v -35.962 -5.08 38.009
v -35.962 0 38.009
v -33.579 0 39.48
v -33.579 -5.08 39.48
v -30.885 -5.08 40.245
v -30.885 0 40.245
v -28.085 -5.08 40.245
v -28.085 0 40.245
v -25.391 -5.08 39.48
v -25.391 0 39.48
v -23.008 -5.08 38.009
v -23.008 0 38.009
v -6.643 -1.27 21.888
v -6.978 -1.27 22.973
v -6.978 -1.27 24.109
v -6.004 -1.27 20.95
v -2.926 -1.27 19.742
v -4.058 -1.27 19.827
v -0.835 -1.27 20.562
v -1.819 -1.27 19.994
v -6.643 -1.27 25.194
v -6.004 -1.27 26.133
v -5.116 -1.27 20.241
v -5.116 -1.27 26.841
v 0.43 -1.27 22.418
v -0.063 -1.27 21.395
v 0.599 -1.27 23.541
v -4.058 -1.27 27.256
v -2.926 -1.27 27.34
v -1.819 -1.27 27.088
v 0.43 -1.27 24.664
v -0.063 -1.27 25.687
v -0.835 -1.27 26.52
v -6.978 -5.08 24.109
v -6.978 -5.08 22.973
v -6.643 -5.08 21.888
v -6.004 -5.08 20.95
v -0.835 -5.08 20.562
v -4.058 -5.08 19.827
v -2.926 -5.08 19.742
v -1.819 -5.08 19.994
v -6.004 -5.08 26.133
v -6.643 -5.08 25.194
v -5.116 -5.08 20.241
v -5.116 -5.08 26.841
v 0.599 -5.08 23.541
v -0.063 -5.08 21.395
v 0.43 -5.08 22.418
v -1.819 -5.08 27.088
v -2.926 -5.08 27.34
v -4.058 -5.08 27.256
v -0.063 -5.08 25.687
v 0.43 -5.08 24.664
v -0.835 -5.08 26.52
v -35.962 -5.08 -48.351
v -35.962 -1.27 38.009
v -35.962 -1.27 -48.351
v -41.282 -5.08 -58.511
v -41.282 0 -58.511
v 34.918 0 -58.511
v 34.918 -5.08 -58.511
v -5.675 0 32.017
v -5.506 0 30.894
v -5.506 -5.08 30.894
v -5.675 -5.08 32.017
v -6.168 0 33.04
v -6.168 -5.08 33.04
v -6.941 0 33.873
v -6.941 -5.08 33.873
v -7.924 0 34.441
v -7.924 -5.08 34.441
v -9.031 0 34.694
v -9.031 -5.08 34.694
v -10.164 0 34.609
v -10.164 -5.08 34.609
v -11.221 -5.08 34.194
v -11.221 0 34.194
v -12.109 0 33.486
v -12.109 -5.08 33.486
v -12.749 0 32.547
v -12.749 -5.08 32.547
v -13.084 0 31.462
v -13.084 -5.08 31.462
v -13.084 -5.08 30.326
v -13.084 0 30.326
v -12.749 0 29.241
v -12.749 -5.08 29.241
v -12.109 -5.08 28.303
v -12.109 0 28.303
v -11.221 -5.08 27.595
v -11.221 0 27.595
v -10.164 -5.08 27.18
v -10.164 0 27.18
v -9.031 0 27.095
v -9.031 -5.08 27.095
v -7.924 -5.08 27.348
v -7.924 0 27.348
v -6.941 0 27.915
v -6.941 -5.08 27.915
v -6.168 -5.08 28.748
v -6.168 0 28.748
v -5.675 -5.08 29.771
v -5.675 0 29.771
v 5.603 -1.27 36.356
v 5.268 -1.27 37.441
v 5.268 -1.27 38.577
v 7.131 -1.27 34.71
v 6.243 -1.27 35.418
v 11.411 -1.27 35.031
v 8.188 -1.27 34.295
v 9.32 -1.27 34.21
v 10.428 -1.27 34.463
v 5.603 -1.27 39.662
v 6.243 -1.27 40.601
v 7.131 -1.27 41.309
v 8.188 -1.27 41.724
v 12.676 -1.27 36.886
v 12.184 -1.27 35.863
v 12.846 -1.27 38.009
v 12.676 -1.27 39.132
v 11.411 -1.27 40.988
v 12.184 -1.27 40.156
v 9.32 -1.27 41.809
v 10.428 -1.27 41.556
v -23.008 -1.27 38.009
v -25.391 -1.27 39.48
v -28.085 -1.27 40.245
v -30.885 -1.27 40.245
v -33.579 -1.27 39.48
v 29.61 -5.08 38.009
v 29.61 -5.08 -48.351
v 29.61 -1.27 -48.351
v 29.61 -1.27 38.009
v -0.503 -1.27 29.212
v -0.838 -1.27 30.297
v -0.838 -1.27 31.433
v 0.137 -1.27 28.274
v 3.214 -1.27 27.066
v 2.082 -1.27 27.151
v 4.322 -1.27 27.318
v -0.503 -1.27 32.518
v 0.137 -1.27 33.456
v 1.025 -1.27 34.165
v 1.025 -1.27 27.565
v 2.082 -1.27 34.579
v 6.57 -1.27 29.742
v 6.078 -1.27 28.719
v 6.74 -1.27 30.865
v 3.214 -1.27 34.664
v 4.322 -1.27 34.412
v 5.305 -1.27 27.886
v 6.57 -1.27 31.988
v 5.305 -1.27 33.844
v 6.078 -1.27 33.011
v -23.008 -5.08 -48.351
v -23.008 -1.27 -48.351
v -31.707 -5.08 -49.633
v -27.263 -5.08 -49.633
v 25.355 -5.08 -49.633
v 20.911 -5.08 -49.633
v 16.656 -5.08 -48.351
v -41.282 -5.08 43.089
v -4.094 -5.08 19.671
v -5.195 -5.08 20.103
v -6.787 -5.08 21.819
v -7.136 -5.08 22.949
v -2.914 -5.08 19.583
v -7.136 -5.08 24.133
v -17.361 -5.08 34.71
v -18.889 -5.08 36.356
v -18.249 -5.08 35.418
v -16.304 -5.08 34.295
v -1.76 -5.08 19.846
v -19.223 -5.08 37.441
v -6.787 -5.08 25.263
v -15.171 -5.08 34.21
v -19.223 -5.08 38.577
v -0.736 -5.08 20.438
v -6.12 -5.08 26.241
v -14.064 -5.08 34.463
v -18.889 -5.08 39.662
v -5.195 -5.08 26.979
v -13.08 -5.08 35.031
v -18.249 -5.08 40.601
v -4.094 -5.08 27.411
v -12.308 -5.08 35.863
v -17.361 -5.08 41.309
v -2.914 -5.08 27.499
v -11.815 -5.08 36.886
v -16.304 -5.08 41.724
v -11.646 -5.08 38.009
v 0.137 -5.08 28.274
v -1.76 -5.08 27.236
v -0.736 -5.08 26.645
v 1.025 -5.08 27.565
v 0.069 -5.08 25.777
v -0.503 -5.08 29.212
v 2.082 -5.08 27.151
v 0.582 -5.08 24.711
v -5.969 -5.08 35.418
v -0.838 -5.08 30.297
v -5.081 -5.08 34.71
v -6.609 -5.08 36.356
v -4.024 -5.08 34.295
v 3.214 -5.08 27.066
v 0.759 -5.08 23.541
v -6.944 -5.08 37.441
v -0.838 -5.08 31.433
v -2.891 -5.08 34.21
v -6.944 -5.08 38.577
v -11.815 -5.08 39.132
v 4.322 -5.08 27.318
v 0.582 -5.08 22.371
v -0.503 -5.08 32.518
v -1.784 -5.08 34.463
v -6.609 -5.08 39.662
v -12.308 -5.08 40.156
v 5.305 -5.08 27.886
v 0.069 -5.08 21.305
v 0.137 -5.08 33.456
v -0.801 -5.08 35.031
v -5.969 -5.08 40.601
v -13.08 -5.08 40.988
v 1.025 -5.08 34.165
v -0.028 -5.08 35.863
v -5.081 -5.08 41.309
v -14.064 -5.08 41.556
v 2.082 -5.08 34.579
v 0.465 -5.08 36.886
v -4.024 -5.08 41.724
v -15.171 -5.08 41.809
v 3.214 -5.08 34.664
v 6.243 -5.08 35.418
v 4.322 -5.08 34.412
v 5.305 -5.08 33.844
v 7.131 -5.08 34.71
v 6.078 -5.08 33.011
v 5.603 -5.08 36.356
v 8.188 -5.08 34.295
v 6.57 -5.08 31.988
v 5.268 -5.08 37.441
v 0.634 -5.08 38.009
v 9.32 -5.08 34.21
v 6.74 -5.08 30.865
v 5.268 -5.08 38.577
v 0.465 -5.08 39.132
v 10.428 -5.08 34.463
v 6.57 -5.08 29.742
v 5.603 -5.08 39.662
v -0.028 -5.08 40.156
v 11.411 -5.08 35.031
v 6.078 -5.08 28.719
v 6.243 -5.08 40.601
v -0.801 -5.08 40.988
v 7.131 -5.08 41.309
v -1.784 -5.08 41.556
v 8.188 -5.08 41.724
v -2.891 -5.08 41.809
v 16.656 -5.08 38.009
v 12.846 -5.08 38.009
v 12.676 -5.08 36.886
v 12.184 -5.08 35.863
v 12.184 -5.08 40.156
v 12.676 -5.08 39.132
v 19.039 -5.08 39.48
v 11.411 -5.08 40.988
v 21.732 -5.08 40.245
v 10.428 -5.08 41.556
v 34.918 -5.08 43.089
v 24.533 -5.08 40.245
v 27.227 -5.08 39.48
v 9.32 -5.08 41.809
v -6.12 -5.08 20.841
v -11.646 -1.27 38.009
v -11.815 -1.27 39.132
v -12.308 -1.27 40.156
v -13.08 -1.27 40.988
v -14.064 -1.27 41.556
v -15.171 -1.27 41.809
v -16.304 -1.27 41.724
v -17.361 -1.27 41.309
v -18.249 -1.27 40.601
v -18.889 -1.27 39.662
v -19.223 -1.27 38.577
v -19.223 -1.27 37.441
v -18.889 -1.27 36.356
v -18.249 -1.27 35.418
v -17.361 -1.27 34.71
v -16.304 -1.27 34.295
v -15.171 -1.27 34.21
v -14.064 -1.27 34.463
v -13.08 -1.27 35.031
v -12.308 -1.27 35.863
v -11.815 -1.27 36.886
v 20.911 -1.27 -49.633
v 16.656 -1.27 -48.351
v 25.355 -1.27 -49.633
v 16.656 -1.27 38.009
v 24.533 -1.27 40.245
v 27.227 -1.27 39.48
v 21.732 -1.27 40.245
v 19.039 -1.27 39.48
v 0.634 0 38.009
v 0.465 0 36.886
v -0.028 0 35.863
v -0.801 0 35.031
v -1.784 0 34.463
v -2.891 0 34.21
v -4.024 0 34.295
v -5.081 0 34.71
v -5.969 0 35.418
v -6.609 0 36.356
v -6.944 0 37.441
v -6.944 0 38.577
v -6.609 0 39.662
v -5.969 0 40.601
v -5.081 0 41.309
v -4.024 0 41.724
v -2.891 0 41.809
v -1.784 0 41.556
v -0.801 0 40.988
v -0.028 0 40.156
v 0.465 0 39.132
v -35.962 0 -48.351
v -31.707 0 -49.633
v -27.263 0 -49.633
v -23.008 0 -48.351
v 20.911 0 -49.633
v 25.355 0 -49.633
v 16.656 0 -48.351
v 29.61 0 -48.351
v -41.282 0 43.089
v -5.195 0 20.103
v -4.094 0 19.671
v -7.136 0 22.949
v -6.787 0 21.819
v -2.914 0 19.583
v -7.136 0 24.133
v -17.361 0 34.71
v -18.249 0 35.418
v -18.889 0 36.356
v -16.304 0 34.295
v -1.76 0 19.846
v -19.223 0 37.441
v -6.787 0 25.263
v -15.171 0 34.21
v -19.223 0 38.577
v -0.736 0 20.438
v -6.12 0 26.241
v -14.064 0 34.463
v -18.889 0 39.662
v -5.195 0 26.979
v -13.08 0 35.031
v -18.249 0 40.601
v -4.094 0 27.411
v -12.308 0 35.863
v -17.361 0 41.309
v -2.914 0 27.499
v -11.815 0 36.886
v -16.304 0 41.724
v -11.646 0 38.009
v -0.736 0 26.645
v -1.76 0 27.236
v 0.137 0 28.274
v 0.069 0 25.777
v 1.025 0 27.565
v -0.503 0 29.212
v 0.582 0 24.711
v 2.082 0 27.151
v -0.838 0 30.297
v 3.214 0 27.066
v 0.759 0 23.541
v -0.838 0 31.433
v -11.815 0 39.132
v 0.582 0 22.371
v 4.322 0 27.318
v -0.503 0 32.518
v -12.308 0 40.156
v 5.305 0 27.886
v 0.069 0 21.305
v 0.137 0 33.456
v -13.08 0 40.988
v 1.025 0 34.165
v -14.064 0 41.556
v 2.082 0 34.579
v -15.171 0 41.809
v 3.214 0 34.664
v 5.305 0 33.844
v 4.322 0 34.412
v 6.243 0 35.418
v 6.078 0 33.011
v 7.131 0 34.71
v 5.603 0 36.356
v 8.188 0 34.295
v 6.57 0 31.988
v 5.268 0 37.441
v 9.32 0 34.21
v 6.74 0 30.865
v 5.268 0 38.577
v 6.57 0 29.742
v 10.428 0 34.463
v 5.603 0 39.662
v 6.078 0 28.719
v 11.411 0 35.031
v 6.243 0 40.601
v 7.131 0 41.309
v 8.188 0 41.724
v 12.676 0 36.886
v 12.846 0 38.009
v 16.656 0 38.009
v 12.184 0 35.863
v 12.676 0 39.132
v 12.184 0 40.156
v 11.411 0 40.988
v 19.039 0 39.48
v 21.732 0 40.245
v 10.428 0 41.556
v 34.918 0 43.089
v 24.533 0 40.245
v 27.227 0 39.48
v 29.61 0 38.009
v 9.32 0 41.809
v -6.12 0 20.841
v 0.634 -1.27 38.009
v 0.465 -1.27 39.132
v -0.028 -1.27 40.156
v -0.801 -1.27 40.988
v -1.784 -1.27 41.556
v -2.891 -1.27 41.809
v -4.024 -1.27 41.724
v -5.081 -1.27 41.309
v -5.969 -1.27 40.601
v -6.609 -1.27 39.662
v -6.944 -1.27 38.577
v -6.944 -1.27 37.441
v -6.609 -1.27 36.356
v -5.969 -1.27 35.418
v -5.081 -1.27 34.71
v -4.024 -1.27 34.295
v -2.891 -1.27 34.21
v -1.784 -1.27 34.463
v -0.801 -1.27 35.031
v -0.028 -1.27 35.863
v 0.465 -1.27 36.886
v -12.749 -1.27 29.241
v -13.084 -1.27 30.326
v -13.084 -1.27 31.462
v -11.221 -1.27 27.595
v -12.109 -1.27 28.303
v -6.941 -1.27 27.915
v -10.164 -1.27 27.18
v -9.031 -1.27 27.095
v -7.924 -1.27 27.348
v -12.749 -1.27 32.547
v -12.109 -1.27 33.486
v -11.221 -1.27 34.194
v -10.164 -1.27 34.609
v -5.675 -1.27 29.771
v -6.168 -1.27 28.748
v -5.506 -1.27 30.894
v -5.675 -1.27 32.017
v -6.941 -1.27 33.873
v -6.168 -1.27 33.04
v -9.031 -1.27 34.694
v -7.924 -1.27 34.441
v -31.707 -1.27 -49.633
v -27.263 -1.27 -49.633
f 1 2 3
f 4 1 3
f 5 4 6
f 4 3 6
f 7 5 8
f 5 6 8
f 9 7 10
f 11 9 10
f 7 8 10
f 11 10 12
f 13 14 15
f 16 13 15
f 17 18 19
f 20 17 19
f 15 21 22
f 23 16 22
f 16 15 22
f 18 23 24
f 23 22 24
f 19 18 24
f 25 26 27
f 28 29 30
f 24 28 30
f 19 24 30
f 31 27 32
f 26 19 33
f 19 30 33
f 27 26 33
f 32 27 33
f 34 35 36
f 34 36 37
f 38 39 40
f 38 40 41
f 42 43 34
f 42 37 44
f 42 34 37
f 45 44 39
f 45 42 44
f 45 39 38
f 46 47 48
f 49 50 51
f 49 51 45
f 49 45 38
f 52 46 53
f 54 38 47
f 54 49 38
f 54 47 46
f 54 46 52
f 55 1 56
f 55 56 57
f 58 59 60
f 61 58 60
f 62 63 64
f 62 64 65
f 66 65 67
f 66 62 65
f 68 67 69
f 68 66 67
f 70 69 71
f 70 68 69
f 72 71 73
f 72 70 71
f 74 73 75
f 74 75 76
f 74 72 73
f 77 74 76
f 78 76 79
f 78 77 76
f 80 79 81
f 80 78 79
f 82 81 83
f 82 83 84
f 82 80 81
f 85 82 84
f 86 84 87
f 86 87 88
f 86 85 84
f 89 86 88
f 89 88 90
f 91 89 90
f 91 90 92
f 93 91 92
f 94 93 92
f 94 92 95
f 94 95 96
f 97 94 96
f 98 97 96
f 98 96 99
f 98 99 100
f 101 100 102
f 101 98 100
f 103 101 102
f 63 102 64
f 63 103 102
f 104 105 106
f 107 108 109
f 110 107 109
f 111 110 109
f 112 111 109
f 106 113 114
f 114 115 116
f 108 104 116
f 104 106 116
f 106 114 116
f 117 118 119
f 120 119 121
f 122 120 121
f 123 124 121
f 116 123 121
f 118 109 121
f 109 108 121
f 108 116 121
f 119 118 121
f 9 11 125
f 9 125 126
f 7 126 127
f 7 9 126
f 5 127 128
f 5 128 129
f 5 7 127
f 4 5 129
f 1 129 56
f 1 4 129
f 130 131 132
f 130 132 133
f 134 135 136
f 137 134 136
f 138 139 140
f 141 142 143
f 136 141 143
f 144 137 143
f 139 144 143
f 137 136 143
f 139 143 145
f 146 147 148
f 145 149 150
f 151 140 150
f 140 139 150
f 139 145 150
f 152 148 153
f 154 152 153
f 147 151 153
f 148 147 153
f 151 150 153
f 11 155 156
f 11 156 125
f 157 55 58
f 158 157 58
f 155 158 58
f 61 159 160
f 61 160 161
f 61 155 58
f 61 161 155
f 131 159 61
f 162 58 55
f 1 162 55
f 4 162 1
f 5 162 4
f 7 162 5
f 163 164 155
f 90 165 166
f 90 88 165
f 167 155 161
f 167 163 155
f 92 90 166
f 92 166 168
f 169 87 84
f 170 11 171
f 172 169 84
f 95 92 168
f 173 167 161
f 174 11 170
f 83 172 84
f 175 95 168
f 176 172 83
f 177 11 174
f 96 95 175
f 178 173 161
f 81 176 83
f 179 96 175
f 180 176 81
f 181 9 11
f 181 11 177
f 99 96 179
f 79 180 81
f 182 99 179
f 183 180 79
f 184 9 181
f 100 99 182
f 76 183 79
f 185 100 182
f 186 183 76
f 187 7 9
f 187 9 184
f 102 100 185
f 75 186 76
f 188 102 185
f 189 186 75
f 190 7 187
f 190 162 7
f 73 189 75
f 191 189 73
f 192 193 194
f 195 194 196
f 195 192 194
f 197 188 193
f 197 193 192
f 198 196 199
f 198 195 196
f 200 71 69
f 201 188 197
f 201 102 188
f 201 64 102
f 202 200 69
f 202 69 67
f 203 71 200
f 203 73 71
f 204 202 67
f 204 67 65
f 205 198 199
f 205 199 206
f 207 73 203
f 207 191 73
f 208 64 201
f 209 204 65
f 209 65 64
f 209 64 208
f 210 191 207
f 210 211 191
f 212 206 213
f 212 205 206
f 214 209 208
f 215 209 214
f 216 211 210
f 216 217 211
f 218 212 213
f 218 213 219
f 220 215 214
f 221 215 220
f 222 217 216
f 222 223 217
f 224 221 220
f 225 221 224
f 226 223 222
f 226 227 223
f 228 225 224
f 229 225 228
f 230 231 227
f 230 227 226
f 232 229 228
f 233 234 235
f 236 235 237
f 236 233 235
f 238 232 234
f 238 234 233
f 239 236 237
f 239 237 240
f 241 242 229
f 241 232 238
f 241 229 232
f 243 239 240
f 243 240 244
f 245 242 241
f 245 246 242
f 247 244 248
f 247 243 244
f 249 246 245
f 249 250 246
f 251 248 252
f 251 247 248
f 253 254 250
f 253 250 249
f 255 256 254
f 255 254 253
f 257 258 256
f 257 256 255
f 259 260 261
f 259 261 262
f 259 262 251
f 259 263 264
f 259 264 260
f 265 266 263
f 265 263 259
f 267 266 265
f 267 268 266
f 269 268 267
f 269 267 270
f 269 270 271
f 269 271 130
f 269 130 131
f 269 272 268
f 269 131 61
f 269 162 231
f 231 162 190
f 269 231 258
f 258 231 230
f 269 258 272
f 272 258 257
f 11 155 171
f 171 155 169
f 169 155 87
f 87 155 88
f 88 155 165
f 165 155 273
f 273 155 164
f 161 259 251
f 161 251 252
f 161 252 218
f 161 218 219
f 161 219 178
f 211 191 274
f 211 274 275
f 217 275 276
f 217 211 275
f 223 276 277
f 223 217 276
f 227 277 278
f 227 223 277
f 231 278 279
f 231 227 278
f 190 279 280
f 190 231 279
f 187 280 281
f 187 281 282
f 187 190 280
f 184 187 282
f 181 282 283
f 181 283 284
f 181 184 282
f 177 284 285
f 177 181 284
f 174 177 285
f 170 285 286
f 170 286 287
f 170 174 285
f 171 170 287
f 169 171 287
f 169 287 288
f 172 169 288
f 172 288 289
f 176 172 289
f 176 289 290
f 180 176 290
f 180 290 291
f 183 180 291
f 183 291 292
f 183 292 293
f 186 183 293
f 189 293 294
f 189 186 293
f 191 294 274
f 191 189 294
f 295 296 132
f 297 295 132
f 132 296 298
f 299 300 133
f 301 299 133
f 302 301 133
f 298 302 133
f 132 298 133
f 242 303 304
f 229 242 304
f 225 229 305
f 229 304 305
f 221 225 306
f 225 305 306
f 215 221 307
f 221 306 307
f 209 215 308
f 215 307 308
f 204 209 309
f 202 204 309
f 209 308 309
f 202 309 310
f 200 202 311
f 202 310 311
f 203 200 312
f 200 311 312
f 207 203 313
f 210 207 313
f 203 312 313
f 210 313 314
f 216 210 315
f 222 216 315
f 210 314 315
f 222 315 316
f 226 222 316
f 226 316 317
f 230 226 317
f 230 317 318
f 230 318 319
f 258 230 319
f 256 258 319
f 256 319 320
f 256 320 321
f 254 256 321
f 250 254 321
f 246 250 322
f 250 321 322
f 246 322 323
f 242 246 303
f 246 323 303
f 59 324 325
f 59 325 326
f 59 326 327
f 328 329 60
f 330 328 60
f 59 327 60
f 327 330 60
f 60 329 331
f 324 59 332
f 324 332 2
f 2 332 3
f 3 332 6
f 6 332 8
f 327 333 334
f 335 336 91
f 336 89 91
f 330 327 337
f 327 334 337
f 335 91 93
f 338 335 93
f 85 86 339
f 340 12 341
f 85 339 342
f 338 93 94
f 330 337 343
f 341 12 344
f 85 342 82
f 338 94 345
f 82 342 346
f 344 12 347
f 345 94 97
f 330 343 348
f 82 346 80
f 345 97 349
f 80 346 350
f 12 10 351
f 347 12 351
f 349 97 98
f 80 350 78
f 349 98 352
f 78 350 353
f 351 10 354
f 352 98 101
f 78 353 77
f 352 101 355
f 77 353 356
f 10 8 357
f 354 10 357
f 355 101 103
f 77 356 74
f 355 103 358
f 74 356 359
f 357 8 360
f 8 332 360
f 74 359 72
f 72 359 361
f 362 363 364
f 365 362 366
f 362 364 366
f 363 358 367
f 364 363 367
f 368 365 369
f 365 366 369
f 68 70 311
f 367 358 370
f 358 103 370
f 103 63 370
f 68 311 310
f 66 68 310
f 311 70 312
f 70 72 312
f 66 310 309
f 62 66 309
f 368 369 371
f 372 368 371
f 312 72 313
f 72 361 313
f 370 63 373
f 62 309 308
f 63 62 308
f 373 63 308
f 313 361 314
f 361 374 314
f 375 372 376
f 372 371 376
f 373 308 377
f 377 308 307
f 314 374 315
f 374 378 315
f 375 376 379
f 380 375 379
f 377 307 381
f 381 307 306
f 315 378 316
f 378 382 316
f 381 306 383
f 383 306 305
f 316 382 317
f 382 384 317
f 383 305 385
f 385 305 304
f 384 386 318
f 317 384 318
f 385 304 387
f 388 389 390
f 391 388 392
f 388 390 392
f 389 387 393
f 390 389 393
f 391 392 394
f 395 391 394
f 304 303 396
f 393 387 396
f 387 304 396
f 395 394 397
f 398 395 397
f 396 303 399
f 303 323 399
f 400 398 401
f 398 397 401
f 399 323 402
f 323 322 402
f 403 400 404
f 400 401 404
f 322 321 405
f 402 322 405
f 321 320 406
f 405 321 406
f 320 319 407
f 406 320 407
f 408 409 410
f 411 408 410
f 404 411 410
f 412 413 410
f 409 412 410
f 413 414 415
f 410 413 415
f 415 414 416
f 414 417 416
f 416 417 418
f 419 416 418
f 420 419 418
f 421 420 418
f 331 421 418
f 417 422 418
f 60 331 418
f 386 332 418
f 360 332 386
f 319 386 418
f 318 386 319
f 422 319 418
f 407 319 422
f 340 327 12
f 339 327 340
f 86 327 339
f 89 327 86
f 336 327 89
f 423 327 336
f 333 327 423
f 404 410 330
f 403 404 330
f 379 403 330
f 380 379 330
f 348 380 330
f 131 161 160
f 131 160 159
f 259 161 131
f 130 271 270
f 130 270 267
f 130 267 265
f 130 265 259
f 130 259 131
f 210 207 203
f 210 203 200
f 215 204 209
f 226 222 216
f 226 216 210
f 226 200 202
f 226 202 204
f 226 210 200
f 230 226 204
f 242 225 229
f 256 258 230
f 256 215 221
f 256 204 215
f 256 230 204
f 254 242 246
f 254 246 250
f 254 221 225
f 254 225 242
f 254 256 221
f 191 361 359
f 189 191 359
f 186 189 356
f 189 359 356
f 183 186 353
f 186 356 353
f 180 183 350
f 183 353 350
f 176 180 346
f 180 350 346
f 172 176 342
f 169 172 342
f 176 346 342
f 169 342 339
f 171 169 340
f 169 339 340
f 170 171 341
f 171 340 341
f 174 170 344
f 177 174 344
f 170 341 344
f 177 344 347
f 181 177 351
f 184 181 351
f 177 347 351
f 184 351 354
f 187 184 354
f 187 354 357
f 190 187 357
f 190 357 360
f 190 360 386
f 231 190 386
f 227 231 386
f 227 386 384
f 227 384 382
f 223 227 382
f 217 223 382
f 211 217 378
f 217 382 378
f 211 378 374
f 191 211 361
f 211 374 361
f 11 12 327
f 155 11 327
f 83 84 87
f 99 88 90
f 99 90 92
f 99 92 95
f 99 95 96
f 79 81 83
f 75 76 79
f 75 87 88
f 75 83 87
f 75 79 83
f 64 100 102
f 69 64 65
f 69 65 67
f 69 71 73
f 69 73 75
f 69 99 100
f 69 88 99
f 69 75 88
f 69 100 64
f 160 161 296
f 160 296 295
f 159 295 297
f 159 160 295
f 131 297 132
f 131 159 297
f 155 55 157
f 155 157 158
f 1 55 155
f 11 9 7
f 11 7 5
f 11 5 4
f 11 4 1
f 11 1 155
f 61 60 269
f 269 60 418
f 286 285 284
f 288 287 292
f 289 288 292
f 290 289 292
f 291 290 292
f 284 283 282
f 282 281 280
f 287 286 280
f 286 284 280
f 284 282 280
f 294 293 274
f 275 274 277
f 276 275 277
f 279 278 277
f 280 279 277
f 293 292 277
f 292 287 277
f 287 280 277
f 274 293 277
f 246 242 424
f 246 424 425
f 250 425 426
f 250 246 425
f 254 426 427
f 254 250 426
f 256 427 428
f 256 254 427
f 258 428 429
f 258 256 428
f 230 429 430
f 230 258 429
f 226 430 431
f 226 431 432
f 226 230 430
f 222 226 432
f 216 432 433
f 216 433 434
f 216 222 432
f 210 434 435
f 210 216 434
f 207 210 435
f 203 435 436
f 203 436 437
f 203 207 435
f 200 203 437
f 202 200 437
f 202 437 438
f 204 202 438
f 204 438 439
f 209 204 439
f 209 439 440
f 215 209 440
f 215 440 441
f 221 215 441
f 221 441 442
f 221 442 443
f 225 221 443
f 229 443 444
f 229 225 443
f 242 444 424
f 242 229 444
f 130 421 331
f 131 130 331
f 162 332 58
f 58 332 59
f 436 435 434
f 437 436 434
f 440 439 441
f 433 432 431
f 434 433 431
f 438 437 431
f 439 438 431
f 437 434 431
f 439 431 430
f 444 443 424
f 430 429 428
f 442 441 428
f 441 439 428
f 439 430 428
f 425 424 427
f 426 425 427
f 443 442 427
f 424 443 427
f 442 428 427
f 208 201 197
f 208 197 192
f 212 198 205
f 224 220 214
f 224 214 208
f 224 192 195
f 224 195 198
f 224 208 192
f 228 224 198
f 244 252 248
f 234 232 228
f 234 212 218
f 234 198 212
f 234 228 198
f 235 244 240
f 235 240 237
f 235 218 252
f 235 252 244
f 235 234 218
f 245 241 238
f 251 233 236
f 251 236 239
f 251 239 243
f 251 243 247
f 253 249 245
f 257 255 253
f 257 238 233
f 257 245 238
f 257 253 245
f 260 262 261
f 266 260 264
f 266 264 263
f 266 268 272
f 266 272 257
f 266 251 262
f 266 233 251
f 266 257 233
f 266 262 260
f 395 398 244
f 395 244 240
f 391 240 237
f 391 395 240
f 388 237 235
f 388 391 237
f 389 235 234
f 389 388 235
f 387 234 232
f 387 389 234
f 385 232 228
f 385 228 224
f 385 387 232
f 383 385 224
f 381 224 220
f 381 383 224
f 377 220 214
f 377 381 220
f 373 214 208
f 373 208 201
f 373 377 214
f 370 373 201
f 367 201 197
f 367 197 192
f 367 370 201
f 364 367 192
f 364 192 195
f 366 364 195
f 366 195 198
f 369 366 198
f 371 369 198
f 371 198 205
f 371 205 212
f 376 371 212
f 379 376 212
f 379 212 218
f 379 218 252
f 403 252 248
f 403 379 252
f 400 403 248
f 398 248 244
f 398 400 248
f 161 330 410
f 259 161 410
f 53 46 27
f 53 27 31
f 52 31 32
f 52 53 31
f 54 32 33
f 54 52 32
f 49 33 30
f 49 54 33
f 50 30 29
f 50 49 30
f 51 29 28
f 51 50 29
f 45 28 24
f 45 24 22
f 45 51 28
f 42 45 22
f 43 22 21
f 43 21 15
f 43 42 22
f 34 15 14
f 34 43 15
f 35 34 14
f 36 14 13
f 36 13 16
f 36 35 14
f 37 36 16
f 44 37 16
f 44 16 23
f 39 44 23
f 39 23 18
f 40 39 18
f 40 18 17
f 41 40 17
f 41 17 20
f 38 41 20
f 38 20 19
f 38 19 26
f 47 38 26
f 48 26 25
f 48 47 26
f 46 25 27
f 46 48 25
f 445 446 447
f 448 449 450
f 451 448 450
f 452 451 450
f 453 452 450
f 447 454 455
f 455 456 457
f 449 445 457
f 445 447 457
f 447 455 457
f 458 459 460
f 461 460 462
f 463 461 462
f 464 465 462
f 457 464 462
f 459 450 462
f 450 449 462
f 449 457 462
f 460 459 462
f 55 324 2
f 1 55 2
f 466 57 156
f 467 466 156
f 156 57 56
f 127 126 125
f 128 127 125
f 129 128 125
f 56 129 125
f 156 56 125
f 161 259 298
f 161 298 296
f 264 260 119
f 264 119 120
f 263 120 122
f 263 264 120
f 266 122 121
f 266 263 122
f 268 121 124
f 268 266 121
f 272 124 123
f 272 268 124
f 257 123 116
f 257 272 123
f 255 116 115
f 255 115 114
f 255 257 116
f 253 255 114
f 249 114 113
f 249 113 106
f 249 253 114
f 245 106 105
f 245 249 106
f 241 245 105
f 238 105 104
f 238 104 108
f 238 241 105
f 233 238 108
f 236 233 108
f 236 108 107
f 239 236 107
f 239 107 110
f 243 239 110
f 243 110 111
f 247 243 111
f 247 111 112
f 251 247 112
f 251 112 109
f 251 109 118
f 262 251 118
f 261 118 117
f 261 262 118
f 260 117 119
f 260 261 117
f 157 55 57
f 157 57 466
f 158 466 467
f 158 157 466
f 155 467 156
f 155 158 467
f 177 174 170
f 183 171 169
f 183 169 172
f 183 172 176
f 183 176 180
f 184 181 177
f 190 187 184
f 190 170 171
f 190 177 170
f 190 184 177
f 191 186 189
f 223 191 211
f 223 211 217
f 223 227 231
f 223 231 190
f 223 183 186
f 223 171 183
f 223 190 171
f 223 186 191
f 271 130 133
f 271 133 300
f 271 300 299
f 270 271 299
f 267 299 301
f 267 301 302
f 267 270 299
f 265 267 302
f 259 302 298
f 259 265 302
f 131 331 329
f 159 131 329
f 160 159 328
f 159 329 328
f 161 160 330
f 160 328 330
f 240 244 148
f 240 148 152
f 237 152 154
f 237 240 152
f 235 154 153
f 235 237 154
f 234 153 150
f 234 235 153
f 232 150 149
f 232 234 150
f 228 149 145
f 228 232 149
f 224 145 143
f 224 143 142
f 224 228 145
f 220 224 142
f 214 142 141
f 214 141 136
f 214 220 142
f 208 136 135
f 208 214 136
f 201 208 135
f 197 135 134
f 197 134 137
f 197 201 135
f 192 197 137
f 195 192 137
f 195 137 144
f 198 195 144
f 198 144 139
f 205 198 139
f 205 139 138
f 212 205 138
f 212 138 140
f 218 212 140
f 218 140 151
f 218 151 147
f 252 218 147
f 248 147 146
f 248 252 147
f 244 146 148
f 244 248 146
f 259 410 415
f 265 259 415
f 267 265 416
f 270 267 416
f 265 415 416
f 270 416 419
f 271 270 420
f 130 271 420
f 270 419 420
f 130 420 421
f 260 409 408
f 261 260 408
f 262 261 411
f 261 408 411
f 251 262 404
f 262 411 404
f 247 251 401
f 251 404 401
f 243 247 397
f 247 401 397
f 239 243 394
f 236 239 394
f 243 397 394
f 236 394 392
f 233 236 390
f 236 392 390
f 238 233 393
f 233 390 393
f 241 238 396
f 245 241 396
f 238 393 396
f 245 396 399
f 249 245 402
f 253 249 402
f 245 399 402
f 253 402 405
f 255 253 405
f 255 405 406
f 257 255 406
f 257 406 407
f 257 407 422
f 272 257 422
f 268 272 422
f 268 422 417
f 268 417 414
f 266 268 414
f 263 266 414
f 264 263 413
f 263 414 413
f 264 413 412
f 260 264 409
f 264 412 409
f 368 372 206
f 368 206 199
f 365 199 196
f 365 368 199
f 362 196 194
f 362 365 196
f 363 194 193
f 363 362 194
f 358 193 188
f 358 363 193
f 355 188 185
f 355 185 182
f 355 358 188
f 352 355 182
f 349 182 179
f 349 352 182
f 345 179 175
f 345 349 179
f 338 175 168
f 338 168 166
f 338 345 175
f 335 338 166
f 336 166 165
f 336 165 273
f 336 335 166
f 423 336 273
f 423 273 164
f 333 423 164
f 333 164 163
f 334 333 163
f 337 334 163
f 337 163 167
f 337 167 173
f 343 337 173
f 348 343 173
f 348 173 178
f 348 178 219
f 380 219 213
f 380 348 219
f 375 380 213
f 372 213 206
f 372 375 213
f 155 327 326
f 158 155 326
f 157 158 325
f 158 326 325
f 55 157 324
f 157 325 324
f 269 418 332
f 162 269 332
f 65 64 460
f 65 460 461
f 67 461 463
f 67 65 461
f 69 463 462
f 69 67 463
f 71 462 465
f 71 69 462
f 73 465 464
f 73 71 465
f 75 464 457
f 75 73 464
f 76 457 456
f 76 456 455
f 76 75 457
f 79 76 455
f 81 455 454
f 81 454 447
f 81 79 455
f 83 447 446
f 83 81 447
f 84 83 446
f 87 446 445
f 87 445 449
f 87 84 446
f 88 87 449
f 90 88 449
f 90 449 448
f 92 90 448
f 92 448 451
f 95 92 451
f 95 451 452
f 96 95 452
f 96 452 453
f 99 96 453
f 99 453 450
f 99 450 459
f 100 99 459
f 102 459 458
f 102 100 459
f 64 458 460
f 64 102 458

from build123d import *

# Parameters (mm, degrees)
F0_R     = 3.969461057
F0_R_2   = 3.81
F2_DEPTH = 5.08
F3_R     = 3.81
F4_DEPTH = 3.81


# Not quite as in the source:
# - the program builds the solid bodies; features that only make, move or delete a surface that nothing else refers to are left out


with BuildPart() as f2:
    # F0 (on Front) → F2 (new body)
    with BuildSketch(Plane.XZ):
        Polygon((34.9182439864, 43.0892817676), (-41.2817560136, 43.0892817676), (-41.2817560136, -58.5107182324), (34.9182439864, -58.5107182324), (34.9182439864, 38.0092817676), align=None)
        with BuildLine():
            ThreePointArc((-35.9619408846, 38.0092817676), (-29.4849408846, 40.3415061576), (-23.0079408846, 38.0092817676))
            Line((-23.0079408846, 38.0092817676), (-23.0079408846, -48.3507182324))
            ThreePointArc((-23.0079408846, -48.3507182324), (-29.4849408846, -49.7955715858), (-35.9619408846, -48.3507182324))
            Line((-35.9619408846, -48.3507182324), (-35.9619408846, 38.0092817676))
        make_face(mode=Mode.SUBTRACT)
        with Locations((-3.2106578548, 23.5410566752)):
            Circle(F0_R, mode=Mode.SUBTRACT)
        with BuildLine():
            ThreePointArc((-19.2659630901, 38.0092817676), (-15.4559630901, 41.8192817676), (-11.6459630901, 38.0092817676))
            ThreePointArc((-11.6459630901, 38.0092817676), (-15.4559630901, 34.1992817676), (-19.2659630901, 38.0092817676))
        make_face(mode=Mode.SUBTRACT)
        with Locations((-9.3160557696, 30.8942313745)):
            Circle(F0_R_2, mode=Mode.SUBTRACT)
        with BuildLine():
            ThreePointArc((16.6556439864, 38.0092817676), (23.1326439864, 40.3415061576), (29.6096439864, 38.0092817676))
            Line((29.6096439864, 38.0092817676), (29.6096439864, -48.3507182324))
            ThreePointArc((29.6096439864, -48.3507182324), (23.1326439864, -49.7955715858), (16.6556439864, -48.3507182324))
            Line((16.6556439864, -48.3507182324), (16.6556439864, 38.0092817676))
        make_face(mode=Mode.SUBTRACT)
        with Locations((2.9297477686, 30.8650228573)):
            Circle(F0_R_2, mode=Mode.SUBTRACT)
        with BuildLine():
            ThreePointArc((-6.9861484491, 38.0092817676), (-3.1761484491, 41.8192817676), (0.6338515509, 38.0092817676))
            ThreePointArc((0.6338515509, 38.0092817676), (-3.1761484491, 34.1992817676), (-6.9861484491, 38.0092817676))
        make_face(mode=Mode.SUBTRACT)
        with BuildLine():
            ThreePointArc((5.2256439864, 38.0092817676), (9.0356439864, 41.8192817676), (12.8456439864, 38.0092817676))
            ThreePointArc((12.8456439864, 38.0092817676), (9.0356439864, 34.1992817676), (5.2256439864, 38.0092817676))
        make_face(mode=Mode.SUBTRACT)
    extrude(amount=F2_DEPTH)


with BuildPart() as f4:
    # F3 (on face) → F4 (new body)
    with BuildSketch(Plane.XZ.offset(5.08)):
        with Locations((-15.4559630901, 38.0092817676)):
            Circle(F3_R)
    extrude(amount=-F4_DEPTH)


with BuildPart() as f4b:
    # F3 (on face) → F4, piece 2 (new body)
    with BuildSketch(Plane.XZ.offset(5.08)):
        with Locations((-3.1761484491, 38.0092817676)):
            Circle(F3_R)
    extrude(amount=-F4_DEPTH)


with BuildPart() as f4c:
    # F3 (on face) → F4, piece 3 (new body)
    with BuildSketch(Plane.XZ.offset(5.08)):
        with Locations((9.0356439864, 38.0092817676)):
            Circle(F3_R)
    extrude(amount=-F4_DEPTH)


with BuildPart() as f4d:
    # F3 (on face) → F4, piece 4 (new body)
    with BuildSketch(Plane.XZ.offset(5.08)):
        with Locations((2.9297477686, 30.8650228573)):
            Circle(F3_R)
    extrude(amount=-F4_DEPTH)


with BuildPart() as f4e:
    # F3 (on face) → F4, piece 5 (new body)
    with BuildSketch(Plane.XZ.offset(5.08)):
        with Locations((-9.3160557696, 30.8942313745)):
            Circle(F3_R)
    extrude(amount=-F4_DEPTH)


with BuildPart() as f4f:
    # F3 (on face) → F4, piece 6 (new body)
    with BuildSketch(Plane.XZ.offset(5.08)):
        with Locations((-3.2106578548, 23.5410566752)):
            Circle(F3_R)
    extrude(amount=-F4_DEPTH)


with BuildPart() as f4g:
    # F3 (on face) → F4, piece 7 (new body)
    with BuildSketch(Plane.XZ.offset(5.08)):
        with BuildLine():
            Line((-23.0079408846, -48.3507182324), (-23.0079408846, 38.0092817676))
            ThreePointArc((-23.0079408846, 38.0092817676), (-29.4849408846, 40.2938211878), (-35.9619408846, 38.0092817676))
            Line((-35.9619408846, 38.0092817676), (-35.9619408846, -48.3507182324))
            ThreePointArc((-35.9619408846, -48.3507182324), (-29.4849408846, -49.7955715858), (-23.0079408846, -48.3507182324))
        make_face()
        with BuildLine():
            ThreePointArc((-35.9619408846, 38.0092817676), (-29.4849408846, 40.2938211878), (-23.0079408846, 38.0092817676))
            ThreePointArc((-23.0079408846, 38.0092817676), (-29.4849408846, 40.3415061576), (-35.9619408846, 38.0092817676))
        make_face()
    extrude(amount=-F4_DEPTH)


with BuildPart() as f4h:
    # F3 (on face) → F4, piece 8 (new body)
    with BuildSketch(Plane.XZ.offset(5.08)):
        with BuildLine():
            Line((29.6096439864, -48.3507182324), (29.6096439864, 38.0092817676))
            ThreePointArc((29.6096439864, 38.0092817676), (23.1326439864, 40.3415061576), (16.6556439864, 38.0092817676))
            Line((16.6556439864, 38.0092817676), (16.6556439864, -48.3507182324))
            ThreePointArc((16.6556439864, -48.3507182324), (23.1326439864, -49.7955715858), (29.6096439864, -48.3507182324))
        make_face()
    extrude(amount=-F4_DEPTH)


solid = Compound([f2.part, f4.part, f4b.part, f4c.part, f4d.part, f4e.part, f4f.part, f4g.part, f4h.part])
